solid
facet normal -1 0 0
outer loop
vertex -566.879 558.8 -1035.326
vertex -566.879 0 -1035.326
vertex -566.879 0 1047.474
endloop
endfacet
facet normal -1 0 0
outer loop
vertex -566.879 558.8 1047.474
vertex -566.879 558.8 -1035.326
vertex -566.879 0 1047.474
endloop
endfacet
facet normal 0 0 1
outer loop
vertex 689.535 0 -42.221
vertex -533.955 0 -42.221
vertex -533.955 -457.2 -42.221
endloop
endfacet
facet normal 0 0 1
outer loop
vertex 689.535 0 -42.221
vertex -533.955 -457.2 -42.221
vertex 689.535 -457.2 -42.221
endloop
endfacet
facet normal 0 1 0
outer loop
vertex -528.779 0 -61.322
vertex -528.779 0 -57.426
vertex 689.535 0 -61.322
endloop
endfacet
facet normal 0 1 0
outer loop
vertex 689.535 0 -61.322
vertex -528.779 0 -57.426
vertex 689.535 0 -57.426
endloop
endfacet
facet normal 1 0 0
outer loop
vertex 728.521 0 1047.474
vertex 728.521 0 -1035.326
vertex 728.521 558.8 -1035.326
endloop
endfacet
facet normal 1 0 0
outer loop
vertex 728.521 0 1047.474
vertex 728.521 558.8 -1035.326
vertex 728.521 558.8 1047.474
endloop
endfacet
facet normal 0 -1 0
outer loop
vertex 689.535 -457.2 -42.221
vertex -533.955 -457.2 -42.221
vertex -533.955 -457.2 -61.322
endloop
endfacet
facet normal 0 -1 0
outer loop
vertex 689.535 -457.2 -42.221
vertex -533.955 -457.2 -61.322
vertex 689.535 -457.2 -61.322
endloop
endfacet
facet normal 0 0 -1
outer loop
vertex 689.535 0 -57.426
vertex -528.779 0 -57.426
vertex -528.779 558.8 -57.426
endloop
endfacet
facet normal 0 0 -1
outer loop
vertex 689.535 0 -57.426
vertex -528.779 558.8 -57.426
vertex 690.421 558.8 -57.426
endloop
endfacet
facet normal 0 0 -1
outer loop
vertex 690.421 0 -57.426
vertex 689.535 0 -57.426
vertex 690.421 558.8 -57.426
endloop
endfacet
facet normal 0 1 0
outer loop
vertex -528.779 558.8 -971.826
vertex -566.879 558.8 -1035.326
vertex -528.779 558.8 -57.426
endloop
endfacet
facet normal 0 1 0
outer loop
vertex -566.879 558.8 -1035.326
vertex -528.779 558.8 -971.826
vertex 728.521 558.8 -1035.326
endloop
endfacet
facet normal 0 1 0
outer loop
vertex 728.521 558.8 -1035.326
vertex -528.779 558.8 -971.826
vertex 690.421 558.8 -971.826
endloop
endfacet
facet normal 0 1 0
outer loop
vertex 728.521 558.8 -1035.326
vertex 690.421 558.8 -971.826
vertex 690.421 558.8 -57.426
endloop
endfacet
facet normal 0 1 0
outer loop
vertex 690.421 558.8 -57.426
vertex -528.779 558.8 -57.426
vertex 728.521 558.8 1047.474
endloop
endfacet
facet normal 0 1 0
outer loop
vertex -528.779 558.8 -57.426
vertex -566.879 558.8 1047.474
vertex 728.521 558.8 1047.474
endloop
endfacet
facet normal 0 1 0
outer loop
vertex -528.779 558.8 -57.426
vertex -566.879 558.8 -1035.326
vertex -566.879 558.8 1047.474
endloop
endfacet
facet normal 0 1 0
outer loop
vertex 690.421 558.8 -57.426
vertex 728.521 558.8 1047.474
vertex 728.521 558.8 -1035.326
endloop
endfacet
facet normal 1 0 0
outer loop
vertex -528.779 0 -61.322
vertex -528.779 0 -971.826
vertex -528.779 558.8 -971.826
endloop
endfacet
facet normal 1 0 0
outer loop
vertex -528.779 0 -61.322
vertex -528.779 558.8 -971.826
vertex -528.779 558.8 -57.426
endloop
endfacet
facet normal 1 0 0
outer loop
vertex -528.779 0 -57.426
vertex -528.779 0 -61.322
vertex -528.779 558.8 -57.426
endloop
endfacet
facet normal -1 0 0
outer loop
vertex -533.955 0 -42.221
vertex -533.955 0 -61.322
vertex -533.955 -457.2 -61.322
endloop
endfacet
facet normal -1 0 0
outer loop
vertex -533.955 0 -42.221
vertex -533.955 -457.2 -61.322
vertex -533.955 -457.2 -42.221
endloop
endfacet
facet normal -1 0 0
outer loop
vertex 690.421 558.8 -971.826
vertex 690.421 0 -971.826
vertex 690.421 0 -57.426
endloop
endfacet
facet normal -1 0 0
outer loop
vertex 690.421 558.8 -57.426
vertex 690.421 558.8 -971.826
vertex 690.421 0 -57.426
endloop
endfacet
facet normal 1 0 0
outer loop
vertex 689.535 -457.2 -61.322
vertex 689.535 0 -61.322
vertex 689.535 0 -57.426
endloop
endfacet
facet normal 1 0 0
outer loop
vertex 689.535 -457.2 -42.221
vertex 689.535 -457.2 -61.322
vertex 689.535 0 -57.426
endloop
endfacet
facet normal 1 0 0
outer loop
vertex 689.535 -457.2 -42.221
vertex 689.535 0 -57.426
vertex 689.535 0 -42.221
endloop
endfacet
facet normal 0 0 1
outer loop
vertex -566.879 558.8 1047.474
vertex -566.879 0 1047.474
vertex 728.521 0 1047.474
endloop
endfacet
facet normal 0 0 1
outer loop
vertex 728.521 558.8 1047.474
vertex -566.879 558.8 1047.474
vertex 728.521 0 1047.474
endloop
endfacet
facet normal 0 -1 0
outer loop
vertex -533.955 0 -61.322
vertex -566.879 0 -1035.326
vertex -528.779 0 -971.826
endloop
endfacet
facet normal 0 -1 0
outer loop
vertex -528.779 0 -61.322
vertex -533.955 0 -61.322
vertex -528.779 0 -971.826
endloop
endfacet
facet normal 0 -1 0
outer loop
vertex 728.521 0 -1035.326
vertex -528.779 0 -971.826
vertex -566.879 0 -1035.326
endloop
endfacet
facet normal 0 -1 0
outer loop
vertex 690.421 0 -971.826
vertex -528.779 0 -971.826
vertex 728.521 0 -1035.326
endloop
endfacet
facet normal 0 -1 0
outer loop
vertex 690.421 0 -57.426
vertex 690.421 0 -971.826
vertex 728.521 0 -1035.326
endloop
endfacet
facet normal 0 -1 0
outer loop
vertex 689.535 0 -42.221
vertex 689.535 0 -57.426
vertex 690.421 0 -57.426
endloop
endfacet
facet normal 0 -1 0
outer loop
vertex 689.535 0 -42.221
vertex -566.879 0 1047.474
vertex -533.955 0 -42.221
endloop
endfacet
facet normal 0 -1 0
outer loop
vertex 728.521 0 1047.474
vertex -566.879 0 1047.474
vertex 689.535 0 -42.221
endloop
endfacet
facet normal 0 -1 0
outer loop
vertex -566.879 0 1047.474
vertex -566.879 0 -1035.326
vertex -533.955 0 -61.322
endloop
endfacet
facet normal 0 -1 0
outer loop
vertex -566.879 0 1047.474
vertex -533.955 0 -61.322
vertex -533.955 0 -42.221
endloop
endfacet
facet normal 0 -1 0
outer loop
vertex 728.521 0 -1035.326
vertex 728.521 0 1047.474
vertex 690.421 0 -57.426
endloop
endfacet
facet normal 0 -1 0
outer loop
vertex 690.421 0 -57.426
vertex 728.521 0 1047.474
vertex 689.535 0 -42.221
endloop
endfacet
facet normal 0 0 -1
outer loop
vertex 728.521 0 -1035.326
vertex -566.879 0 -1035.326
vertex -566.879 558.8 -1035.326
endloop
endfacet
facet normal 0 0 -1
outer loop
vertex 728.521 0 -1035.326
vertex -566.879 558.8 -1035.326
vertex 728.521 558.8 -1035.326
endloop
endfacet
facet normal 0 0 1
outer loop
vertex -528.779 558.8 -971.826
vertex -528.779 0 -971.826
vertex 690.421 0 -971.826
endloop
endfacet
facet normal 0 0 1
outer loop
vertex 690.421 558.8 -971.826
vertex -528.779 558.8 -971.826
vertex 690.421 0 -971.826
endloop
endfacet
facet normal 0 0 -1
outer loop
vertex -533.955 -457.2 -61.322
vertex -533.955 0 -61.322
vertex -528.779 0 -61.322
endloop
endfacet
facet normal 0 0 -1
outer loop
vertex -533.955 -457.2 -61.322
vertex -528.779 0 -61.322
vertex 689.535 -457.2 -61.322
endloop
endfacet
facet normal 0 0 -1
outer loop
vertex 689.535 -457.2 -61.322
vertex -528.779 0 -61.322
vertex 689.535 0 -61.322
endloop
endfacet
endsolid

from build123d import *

# Parameters (mm, degrees)
F0_W      = 1295.4
F0_H      = 2082.8
F1_DEPTH  = 558.8
F3_W      = 1219.2
F3_H      = 914.4
F9_DEPTH  = 558.8
F10_W     = 1223.48994
F10_H     = 19.100845
F11_DEPTH = 457.2


with BuildPart() as f1:
    # F0 (on Front) → F1 (new body)
    with BuildSketch(Plane.XZ):
        with Locations((80.820927, 6.07419)):
            Rectangle(F0_W, F0_H)
    extrude(amount=-F1_DEPTH)

    # F3 (on face) → F9 (cut, through all)
    with BuildSketch(Plane.XZ):
        with Locations((80.820927, -514.62581)):
            Rectangle(F3_W, F3_H)
    extrude(amount=-F9_DEPTH, mode=Mode.SUBTRACT)

    # F10 (on face) → F11 (join)
    with BuildSketch(Plane.XZ):
        with Locations((77.789873, -51.771193)):
            Rectangle(F10_W, F10_H)
    extrude(amount=F11_DEPTH)


solid = f1.part
